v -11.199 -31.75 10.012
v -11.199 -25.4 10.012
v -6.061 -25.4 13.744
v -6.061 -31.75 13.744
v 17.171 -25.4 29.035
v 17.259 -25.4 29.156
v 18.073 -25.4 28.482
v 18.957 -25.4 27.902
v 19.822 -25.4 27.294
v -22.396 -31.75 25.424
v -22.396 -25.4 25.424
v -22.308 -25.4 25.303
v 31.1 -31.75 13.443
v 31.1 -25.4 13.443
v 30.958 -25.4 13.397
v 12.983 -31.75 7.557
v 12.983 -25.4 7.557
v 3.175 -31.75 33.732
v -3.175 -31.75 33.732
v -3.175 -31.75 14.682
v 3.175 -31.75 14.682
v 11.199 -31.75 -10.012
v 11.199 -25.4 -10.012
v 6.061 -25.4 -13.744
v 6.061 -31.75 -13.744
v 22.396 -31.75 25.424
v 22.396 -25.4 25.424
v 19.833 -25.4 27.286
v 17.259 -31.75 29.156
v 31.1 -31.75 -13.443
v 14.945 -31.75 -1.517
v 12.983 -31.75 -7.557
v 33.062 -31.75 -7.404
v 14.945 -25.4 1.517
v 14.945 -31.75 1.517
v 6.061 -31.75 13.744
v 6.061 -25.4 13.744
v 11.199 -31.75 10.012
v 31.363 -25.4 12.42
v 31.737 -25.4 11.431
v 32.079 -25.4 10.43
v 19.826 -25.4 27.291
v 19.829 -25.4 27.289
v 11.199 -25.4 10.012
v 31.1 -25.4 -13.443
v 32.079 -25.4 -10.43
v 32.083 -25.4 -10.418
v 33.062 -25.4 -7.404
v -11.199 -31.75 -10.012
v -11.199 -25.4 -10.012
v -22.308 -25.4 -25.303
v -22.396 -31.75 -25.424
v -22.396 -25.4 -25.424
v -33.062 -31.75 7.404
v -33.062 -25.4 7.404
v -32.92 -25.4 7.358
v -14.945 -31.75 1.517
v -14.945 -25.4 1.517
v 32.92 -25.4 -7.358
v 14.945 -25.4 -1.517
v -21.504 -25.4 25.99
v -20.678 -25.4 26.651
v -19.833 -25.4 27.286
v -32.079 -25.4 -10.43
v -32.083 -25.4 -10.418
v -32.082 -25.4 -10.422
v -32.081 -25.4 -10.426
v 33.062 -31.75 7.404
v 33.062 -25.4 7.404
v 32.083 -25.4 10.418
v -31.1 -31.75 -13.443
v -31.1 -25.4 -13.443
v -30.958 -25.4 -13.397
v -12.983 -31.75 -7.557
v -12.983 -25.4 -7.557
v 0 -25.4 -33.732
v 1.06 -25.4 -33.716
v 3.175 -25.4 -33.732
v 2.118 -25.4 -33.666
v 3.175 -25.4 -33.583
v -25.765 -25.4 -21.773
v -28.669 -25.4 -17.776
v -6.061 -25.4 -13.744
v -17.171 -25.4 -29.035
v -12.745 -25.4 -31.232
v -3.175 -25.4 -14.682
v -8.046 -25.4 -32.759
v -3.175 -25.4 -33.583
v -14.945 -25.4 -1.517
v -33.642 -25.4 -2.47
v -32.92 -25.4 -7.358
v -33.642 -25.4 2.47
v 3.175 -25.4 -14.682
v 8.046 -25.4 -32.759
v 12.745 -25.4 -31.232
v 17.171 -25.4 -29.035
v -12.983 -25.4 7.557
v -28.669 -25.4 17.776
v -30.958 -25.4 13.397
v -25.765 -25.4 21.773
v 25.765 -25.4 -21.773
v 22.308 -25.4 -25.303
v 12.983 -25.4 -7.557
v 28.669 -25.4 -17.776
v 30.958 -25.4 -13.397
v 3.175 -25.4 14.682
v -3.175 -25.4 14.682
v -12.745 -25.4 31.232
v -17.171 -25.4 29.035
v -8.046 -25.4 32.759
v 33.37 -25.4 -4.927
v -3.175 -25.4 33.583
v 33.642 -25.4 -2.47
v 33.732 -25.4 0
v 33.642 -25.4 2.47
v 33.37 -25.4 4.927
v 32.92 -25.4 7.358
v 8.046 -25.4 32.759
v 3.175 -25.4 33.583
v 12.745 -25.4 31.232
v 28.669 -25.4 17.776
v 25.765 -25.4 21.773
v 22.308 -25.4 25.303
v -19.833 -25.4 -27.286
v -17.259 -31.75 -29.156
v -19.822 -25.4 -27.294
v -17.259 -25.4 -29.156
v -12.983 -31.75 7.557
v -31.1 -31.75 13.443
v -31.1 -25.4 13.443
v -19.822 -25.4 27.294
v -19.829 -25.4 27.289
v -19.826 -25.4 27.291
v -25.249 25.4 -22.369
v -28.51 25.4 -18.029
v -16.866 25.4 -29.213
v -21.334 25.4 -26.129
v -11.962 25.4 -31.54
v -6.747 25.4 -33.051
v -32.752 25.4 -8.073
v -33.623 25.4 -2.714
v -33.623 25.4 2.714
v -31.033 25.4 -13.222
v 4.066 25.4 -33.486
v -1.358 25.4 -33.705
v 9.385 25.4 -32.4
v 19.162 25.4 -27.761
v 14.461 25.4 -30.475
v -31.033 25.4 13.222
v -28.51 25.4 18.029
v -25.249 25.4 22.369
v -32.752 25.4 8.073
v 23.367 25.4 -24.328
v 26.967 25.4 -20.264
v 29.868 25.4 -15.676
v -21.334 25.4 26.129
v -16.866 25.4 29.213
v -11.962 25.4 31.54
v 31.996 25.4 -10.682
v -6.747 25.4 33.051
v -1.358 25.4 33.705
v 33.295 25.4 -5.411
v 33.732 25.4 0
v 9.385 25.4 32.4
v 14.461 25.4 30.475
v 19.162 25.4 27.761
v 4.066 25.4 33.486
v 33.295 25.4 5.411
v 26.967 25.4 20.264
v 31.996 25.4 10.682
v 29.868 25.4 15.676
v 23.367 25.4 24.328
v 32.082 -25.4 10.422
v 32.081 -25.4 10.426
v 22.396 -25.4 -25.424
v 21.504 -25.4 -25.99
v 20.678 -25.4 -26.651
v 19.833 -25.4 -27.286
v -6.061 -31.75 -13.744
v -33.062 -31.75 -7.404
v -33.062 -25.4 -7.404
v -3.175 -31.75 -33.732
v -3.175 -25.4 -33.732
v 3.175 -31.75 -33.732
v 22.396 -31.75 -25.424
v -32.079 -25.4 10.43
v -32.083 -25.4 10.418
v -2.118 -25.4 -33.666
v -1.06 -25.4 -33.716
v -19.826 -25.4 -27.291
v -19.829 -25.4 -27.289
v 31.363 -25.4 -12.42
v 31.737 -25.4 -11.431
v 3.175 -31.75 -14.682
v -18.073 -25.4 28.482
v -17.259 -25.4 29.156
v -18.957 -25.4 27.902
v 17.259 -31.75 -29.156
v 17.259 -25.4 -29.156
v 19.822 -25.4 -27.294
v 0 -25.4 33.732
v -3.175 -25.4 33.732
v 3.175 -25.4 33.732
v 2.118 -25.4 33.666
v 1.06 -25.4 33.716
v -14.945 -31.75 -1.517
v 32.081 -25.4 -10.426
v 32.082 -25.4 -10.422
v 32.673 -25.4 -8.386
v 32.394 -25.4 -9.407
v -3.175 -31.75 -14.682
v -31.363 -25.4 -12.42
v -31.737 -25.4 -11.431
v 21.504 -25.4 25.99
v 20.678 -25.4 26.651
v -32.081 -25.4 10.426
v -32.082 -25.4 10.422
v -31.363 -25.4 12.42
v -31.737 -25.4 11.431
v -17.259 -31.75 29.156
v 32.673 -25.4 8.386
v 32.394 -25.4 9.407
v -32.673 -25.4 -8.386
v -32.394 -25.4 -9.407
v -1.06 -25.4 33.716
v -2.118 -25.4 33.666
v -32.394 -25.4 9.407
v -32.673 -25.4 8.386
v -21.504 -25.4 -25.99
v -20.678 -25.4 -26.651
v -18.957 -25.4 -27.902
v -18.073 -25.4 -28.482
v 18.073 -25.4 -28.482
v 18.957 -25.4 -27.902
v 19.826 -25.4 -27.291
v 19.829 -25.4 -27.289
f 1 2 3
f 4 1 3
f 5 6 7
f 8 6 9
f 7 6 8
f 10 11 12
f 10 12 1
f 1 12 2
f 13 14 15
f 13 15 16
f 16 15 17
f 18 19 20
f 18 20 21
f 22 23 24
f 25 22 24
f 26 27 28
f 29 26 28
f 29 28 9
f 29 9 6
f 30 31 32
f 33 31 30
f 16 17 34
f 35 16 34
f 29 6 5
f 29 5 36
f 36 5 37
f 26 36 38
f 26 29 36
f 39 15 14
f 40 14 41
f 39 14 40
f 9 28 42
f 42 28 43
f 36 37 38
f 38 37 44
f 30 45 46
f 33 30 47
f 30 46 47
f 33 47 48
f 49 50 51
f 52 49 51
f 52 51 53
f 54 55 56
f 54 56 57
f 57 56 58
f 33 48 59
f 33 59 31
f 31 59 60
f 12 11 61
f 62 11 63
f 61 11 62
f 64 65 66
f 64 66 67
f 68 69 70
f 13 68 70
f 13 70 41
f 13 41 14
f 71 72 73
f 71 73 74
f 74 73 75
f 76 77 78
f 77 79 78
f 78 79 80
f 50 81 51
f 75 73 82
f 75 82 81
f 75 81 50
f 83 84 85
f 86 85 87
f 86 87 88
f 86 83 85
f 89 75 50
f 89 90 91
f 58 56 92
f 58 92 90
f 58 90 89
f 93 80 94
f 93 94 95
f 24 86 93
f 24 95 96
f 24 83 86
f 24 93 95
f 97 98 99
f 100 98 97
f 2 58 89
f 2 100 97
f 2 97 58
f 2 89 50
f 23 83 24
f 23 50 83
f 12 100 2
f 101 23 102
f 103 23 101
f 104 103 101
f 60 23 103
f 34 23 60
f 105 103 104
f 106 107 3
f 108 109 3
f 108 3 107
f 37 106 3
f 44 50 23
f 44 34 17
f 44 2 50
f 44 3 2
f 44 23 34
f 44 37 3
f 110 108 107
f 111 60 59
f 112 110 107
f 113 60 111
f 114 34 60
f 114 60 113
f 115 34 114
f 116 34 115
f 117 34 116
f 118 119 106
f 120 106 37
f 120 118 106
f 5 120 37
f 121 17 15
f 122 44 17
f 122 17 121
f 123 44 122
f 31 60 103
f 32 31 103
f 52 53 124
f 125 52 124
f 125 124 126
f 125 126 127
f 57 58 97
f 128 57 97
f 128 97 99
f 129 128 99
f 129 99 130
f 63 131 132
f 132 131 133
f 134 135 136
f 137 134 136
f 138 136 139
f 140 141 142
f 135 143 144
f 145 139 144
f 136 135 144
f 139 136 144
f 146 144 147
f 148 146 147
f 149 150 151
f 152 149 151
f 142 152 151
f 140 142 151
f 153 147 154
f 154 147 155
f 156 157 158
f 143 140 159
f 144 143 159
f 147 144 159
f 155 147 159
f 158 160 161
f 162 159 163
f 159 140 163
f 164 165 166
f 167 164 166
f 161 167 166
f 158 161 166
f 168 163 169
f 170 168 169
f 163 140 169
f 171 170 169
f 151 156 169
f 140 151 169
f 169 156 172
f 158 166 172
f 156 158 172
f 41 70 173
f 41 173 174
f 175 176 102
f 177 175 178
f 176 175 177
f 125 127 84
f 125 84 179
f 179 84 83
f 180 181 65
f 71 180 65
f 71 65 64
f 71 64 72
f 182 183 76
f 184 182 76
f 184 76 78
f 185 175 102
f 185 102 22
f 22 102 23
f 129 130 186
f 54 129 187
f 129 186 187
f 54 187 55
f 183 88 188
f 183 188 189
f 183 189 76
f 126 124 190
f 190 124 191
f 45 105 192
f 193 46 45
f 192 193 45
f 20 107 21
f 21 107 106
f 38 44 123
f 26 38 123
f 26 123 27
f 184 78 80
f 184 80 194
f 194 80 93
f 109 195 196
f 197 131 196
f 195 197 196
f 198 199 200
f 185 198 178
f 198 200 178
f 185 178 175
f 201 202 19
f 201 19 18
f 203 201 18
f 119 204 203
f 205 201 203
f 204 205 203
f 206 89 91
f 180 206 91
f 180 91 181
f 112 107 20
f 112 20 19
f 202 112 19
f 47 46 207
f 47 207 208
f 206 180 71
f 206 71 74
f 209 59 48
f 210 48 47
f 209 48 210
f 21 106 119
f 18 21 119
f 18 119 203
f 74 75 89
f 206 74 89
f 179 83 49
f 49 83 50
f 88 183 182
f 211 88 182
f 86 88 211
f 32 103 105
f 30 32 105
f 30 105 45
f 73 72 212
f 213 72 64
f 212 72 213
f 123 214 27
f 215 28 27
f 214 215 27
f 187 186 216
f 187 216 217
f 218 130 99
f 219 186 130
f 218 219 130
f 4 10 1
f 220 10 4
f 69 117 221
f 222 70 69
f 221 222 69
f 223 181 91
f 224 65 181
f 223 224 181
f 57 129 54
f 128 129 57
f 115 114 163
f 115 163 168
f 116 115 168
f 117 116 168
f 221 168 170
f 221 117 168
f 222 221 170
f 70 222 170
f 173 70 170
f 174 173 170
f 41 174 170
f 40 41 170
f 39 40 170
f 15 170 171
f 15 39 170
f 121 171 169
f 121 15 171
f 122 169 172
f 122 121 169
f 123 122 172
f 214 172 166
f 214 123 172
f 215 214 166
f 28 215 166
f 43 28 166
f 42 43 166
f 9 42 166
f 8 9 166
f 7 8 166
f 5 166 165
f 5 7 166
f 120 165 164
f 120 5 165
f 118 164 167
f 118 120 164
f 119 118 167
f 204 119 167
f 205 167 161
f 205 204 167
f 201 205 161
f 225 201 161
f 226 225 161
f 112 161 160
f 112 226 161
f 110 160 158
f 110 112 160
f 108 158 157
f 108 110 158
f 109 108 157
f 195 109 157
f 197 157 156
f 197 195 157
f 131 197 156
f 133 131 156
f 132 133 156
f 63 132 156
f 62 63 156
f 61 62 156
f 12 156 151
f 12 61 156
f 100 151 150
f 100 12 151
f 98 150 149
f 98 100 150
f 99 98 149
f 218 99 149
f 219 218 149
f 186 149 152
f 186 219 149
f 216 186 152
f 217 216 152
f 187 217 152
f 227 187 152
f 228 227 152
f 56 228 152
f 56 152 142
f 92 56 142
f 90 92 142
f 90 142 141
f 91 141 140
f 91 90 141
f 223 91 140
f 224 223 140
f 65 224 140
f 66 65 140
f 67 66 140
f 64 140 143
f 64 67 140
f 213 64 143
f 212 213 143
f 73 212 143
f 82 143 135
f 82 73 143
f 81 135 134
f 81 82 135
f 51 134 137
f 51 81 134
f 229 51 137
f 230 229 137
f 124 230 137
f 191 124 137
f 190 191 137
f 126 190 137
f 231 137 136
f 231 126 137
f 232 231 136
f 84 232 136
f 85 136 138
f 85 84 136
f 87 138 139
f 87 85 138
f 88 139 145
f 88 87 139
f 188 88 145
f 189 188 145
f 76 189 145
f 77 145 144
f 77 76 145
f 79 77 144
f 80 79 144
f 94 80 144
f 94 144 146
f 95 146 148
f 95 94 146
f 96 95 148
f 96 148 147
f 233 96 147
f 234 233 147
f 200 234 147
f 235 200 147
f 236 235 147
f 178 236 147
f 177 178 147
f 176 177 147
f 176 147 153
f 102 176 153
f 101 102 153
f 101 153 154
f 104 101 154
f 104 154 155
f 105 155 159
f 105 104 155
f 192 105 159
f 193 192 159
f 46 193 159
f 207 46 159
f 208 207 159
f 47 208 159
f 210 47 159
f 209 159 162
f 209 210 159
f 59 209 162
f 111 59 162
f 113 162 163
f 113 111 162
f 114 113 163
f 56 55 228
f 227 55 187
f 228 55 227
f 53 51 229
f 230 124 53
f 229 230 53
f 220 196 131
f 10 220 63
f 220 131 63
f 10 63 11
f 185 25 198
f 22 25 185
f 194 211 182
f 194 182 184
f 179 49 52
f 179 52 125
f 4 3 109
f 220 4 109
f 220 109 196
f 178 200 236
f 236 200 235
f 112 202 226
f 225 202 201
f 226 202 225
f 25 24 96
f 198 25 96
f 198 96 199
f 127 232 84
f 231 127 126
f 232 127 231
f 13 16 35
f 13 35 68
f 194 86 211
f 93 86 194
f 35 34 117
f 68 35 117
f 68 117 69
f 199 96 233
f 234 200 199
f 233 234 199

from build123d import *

# Parameters (mm, degrees)
F0_R     = 33.732281
F1_DEPTH = 25.4
F2_W     = 6.35
F2_H     = 19.05
F3_DEPTH = 6.35


with BuildPart() as f1:
    # F0 (on Front) → F1 (new body, symmetric)
    with BuildSketch(Plane.XZ):
        Circle(F0_R)
    extrude(amount=F1_DEPTH, both=True)

    # F2 (on face) → F3 (join)
    with BuildSketch(Plane.XZ.offset(25.4)):
        with Locations((0, 24.207281)):
            Rectangle(F2_W, F2_H)
        Polygon((-11.198657, 10.011996), (-6.061399, 13.744433), (-17.258708, 29.156206), (-22.395966, 25.42377), align=None)
        Polygon((-14.944808, 1.51747), (-12.98255, 7.556679), (-31.100176, 13.443452), (-33.062434, 7.404244), align=None)
        Polygon((-12.98255, -7.556679), (-14.944808, -1.51747), (-33.062434, -7.404244), (-31.100176, -13.443452), align=None)
        Polygon((-6.061399, -13.744433), (-11.198657, -10.011996), (-22.395966, -25.42377), (-17.258708, -29.156206), align=None)
        with Locations((0, -24.207281)):
            Rectangle(F2_W, F2_H)
        Polygon((11.198657, -10.011996), (6.061399, -13.744433), (17.258708, -29.156206), (22.395966, -25.42377), align=None)
        Polygon((14.944808, -1.51747), (12.98255, -7.556679), (31.100176, -13.443452), (33.062434, -7.404244), align=None)
        Polygon((12.98255, 7.556679), (14.944808, 1.51747), (33.062434, 7.404244), (31.100176, 13.443452), align=None)
        Polygon((6.061399, 13.744433), (11.198657, 10.011996), (22.395966, 25.42377), (17.258708, 29.156206), align=None)
    extrude(amount=F3_DEPTH)


solid = f1.part
